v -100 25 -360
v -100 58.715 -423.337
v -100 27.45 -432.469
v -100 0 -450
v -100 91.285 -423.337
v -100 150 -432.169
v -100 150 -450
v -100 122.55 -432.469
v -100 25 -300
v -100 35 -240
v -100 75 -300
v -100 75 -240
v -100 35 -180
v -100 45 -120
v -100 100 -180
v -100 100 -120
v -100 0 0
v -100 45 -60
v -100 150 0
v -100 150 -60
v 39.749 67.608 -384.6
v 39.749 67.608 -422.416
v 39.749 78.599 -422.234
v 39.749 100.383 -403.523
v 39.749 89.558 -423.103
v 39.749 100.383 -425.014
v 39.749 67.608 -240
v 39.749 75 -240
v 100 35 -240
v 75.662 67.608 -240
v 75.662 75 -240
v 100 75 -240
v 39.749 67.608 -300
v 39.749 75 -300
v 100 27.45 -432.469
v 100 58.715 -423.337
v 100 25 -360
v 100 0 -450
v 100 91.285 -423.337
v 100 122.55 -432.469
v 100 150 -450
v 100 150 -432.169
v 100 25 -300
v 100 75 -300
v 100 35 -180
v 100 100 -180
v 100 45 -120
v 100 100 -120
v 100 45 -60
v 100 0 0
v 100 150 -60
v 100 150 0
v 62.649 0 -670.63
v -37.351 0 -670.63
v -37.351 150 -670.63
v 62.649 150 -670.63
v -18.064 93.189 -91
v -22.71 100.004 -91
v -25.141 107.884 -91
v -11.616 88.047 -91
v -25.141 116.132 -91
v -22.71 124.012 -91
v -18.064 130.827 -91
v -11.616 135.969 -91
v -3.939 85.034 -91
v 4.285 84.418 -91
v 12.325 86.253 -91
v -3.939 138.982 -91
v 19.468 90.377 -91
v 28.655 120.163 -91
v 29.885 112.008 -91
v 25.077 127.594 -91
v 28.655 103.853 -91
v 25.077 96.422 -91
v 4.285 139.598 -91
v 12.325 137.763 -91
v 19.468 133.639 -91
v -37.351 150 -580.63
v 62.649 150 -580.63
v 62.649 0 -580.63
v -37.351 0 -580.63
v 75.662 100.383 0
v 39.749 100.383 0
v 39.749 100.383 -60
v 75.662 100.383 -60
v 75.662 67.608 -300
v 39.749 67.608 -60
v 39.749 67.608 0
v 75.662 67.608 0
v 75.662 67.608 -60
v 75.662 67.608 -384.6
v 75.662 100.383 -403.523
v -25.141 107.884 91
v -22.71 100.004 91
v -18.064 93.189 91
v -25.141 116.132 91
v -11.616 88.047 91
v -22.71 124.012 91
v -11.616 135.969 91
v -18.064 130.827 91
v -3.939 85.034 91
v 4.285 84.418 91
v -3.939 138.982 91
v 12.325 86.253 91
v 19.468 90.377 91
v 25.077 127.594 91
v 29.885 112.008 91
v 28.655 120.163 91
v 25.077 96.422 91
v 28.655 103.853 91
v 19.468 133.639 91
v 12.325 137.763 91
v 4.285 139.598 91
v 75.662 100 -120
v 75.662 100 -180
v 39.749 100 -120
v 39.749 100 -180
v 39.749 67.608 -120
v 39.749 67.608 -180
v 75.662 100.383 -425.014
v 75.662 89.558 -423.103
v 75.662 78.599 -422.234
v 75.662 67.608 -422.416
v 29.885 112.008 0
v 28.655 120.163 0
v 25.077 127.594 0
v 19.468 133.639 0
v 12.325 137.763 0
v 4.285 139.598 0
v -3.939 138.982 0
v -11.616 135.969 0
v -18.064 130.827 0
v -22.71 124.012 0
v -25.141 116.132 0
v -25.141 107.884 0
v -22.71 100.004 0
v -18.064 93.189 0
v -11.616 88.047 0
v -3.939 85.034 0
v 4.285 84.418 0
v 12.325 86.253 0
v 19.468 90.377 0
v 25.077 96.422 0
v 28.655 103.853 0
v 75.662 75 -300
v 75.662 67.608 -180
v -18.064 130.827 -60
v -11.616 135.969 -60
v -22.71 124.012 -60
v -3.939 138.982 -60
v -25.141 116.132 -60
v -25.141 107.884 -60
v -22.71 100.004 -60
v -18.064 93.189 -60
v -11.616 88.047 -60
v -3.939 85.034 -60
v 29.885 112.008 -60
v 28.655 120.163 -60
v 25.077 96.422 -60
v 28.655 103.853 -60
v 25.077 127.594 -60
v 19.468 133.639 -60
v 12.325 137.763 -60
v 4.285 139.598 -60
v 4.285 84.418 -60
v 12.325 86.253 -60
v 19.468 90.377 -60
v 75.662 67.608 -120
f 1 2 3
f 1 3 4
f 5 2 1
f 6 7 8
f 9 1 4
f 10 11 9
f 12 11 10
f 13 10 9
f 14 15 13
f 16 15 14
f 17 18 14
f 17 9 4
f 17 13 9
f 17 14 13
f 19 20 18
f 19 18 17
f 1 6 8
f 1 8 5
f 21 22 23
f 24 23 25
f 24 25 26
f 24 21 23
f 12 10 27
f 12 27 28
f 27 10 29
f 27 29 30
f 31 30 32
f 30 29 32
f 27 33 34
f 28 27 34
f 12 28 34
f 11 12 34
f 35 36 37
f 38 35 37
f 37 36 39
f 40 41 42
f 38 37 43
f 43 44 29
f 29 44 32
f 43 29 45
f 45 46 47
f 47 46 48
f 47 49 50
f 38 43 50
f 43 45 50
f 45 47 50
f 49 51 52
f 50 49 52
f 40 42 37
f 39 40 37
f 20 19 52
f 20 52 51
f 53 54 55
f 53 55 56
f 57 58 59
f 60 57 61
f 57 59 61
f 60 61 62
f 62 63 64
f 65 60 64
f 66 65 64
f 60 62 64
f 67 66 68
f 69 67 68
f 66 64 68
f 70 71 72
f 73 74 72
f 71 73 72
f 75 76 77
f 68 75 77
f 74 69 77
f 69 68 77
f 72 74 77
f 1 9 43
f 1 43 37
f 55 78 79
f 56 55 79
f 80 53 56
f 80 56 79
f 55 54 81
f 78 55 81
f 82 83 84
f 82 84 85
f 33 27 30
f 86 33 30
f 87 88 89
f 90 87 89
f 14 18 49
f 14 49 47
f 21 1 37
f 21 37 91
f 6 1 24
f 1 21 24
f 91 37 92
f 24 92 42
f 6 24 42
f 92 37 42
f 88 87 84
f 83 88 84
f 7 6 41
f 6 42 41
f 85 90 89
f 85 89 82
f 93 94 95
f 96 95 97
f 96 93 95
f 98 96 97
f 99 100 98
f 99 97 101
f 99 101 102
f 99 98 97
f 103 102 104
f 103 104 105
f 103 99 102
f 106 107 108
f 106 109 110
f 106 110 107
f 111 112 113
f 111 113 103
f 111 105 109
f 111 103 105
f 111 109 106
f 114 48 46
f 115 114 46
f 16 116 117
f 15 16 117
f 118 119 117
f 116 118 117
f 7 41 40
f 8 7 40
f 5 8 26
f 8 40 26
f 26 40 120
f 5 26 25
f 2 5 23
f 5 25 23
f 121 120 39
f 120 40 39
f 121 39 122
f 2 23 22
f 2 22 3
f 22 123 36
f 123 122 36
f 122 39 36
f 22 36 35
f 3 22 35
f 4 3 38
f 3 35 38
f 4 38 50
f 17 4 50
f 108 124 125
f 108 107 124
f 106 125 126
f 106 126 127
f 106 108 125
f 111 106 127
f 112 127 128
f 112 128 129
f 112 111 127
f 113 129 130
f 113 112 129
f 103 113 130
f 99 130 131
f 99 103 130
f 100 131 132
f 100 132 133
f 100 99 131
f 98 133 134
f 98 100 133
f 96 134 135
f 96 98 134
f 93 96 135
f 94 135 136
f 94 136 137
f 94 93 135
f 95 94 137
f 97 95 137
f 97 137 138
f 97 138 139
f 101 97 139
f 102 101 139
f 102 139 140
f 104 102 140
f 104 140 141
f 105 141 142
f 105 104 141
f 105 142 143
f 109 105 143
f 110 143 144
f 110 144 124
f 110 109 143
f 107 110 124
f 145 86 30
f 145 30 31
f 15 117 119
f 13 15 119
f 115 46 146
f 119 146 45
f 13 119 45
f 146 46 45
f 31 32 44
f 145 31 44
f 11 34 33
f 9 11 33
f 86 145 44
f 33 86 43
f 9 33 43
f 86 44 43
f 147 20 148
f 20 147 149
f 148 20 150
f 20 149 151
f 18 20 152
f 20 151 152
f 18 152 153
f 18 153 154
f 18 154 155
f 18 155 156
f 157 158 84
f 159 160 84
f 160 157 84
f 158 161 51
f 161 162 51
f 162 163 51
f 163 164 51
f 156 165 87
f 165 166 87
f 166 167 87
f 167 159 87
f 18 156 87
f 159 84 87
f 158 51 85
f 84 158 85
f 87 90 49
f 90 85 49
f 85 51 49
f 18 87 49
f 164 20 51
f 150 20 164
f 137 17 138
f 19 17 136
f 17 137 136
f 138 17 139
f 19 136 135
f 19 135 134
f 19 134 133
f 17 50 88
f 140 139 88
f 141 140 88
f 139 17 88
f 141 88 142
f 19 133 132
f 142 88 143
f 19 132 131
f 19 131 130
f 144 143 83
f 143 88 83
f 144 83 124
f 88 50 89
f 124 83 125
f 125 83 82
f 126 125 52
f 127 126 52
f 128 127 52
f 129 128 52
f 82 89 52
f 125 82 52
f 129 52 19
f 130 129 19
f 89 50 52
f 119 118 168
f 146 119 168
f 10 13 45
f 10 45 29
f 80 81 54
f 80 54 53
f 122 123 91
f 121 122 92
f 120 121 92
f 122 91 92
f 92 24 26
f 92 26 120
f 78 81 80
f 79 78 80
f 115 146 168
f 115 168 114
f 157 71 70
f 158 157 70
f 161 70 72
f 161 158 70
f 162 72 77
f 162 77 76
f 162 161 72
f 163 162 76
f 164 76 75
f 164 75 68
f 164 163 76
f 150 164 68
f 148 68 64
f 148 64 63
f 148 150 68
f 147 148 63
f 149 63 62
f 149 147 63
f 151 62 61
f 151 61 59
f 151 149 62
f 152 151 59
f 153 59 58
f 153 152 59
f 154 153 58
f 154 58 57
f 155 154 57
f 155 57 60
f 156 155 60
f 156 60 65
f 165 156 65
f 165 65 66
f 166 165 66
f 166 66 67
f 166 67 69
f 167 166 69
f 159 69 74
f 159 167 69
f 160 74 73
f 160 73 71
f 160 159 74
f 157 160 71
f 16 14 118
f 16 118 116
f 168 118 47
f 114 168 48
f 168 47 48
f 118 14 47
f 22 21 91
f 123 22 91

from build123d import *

# Parameters (mm, degrees)
BOSS_EXTRUDE1_DEPTH     = 100
SKETCH2_W               = 100
SKETCH2_H               = 90
BOSS_EXTRUDE2_DEPTH     = 150
SKETCH4_R               = 27.667400723
BOSS_EXTRUDE3_DEPTH     = 91
CUT_EXTRUDE1_REACH      = 696.438
CUT_EXTRUDE1_END_RADIUS = 115
SKETCH5_W               = 35.913352936
SKETCH5_H               = 32.77529297


with BuildPart() as part:
    # Sketch1 → Boss-Extrude1 (new, symmetric)
    with BuildSketch(Plane(origin=(0, 0, 0), x_dir=(0, 0, -1), z_dir=(1, 0, 0))):
        with BuildLine():
            Line((0, 0), (0, 150))
            Line((0, 150), (60, 150))
            Line((60, 150), (60, 45))
            Line((60, 45), (120, 45))
            Line((120, 45), (120, 100))
            Line((120, 100), (180, 100))
            Line((180, 100), (180, 35))
            Line((180, 35), (240, 35))
            Line((240, 35), (240, 75))
            Line((240, 75), (300, 75))
            Line((300, 75), (300, 25))
            Line((300, 25), (360, 25))
            Line((360, 25), (432.168783649, 150))
            Line((432.168783649, 150), (450, 150))
            ThreePointArc((450, 150), (422.177978871, 75), (450, 0))
            Line((450, 0), (0, 0))
        make_face()
    extrude(amount=BOSS_EXTRUDE1_DEPTH, both=True)

    # Sketch4 → Boss-Extrude3 (add, symmetric)
    with BuildSketch(Plane.XY):
        with Locations((2.217244457, 112.008003776)):
            Circle(SKETCH4_R)
    extrude(amount=BOSS_EXTRUDE3_DEPTH, both=True)

    # Cut-Extrude1: up to this cylinder (the profile starts outside it)
    cut_extrude1_end = Plane(origin=(57.705436, 75, -537.177978871), z_dir=(-1, 0, 0)) * Cylinder(CUT_EXTRUDE1_END_RADIUS, 1623.876, mode=Mode.PRIVATE)
    # Sketch5 → Cut-Extrude1 (cut, up to the surface)
    with BuildSketch(Plane.XY, mode=Mode.PRIVATE) as cut_extrude1_sk1:
        with Locations((57.705436028, 83.995649624)):
            Rectangle(SKETCH5_W, SKETCH5_H)
    cut_extrude1_tool1 = extrude(cut_extrude1_sk1.sketch, amount=-CUT_EXTRUDE1_REACH, mode=Mode.PRIVATE) - cut_extrude1_end
    add(cut_extrude1_tool1.solids().sort_by_distance((57.705436, 83.99565, 0))[0], mode=Mode.SUBTRACT)


with BuildPart() as body_2:
    # Sketch2 → Boss-Extrude2 (new body)
    with BuildSketch(Plane.XZ):
        with Locations((12.648758885, -625.62982313)):
            Rectangle(SKETCH2_W, SKETCH2_H)
    extrude(amount=-BOSS_EXTRUDE2_DEPTH)


solid = Compound([part.part, body_2.part])
